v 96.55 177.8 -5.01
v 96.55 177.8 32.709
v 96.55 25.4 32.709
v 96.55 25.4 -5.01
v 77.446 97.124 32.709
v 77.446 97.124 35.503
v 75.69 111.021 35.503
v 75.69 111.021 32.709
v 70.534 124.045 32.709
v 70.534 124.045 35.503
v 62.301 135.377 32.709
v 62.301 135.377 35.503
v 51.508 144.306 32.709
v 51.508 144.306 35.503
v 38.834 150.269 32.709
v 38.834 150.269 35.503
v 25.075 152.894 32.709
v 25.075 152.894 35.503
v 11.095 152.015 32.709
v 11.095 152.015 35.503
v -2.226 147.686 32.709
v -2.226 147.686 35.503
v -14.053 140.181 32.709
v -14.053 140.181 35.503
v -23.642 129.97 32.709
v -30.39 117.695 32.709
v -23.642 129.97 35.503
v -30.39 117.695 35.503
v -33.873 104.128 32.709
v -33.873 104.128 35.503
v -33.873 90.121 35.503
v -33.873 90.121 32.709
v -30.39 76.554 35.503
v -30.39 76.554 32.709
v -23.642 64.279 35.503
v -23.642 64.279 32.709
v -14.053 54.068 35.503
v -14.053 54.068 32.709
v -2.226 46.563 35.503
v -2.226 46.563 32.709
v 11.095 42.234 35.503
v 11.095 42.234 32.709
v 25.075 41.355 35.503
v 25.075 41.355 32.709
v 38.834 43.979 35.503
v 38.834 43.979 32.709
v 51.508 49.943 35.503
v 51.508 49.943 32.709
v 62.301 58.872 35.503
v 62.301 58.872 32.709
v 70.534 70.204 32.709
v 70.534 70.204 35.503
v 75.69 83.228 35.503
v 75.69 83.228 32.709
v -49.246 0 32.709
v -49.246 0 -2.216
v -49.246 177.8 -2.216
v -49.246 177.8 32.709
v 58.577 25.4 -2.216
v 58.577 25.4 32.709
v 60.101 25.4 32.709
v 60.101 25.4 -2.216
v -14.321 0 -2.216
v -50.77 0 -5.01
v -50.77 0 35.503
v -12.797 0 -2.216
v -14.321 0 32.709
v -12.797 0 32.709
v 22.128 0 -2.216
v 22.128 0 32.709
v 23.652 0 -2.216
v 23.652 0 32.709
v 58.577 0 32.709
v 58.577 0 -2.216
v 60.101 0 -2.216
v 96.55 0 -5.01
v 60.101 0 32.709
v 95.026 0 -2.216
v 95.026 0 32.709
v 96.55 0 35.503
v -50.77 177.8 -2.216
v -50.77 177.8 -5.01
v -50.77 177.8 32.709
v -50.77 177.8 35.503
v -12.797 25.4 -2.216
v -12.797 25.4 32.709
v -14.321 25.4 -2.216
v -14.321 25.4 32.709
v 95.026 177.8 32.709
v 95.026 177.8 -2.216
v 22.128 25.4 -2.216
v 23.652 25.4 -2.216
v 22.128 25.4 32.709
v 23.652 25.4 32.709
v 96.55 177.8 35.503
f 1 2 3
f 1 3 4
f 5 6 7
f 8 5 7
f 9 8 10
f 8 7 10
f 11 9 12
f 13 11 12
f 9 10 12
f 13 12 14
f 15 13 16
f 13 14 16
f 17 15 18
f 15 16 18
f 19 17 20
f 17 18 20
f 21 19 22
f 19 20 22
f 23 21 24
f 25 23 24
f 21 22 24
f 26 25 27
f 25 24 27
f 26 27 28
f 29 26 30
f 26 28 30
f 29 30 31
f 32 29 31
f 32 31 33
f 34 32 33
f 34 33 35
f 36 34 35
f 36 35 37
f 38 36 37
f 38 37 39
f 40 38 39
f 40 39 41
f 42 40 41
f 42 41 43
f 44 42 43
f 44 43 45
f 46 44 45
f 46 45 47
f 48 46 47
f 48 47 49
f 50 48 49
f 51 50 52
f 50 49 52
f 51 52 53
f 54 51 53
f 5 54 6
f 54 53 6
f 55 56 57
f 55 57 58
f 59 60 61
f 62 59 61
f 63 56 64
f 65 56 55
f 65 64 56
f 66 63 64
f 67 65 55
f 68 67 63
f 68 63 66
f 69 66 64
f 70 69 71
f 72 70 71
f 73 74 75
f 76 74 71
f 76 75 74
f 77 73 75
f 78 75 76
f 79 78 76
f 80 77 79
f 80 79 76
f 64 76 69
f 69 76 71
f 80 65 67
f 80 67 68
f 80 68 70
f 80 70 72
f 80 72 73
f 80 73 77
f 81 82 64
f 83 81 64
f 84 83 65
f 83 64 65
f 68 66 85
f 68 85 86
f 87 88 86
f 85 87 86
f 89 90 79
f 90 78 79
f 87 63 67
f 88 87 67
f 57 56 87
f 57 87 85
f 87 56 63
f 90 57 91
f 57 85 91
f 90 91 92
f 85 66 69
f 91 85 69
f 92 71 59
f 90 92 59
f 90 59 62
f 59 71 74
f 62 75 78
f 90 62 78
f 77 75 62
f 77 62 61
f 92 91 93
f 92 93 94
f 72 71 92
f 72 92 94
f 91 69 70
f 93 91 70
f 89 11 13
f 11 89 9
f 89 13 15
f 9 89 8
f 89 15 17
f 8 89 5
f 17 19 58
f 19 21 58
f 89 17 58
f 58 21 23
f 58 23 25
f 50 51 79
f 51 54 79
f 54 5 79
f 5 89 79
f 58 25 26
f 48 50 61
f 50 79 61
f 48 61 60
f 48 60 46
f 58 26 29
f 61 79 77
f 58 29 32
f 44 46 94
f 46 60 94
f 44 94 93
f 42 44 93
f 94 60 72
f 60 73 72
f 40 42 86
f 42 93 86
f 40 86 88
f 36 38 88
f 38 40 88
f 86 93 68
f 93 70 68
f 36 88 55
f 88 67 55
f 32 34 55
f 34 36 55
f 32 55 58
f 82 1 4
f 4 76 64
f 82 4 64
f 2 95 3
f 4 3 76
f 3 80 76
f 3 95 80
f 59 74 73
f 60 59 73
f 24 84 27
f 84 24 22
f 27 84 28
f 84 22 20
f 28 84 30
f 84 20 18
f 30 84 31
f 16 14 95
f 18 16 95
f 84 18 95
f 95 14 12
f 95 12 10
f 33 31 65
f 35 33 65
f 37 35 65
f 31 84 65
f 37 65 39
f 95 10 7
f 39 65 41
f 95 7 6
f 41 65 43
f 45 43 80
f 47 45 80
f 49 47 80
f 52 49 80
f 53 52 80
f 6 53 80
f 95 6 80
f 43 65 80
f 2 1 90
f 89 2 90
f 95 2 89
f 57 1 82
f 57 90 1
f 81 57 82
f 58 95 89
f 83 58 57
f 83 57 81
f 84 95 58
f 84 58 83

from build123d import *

# Parameters (mm, degrees)
F0_W     = 147.32
F0_H     = 40.513
F0_W_2   = 1.524
F0_H_2   = 34.925
F1_DEPTH = 25.4
F2_W     = 1.5239988621
F2_H     = 34.925
F2_W_2   = 1.5240011379
F3_DEPTH = 152.4
F4_R     = 55.88
F5_DEPTH = 25.4


with BuildPart() as f1:
    # F0 (on Front) → F1 (new body)
    with BuildSketch(Plane.XZ):
        with Locations((22.8904561008, 15.2461919377)):
            Rectangle(F0_W, F0_H)
        Polygon((-49.2455427613, 32.7086919377), (-14.3205427613, 32.7086919377), (-12.7965427613, 32.7086919377), (22.1284572387, 32.7086919377), (23.6524572387, 32.7086919377), (58.5774572387, 32.7086919377), (60.1014572387, 32.7086919377), (95.0264572387, 32.7086919377), (95.0264572387, -2.2163080623), (60.1014572387, -2.2163080623), (58.5774572387, -2.2163080623), (23.6524572387, -2.2163080623), (22.1284572387, -2.2163080623), (-12.7965427613, -2.2163080623), (-14.3205427613, -2.2163080623), (-49.2455427613, -2.2163080623), align=None, mode=Mode.SUBTRACT)
        with Locations((-13.5585427613, 15.2461919377)):
            Rectangle(F0_W_2, F0_H_2)
        with Locations((22.8904572387, 15.2461919377)):
            Rectangle(F0_W_2, F0_H_2)
        with Locations((59.3394572387, 15.2461919377)):
            Rectangle(F0_W_2, F0_H_2)
    extrude(amount=-F1_DEPTH)

    # F2 (on face) → F3 (join)
    with BuildSketch(Plane(origin=(0, 25.4, 0), x_dir=(-1, 0, 0), z_dir=(0, 1, 0))):
        with Locations((-95.7884566697, 15.2461919377)):
            Rectangle(F2_W, F2_H)
        Polygon((-60.1014572387, -2.2163080623), (-95.0264572387, -2.2163080623), (-96.5504561008, -2.2163080623), (-96.5504561008, -5.0103080623), (50.7695438992, -5.0103080623), (50.7695438992, -2.2163080623), (49.2455427613, -2.2163080623), (14.3205427613, -2.2163080623), (12.7965427613, -2.2163080623), (-22.1284572387, -2.2163080623), (-23.6524572387, -2.2163080623), (-58.5774572387, -2.2163080623), align=None)
        Polygon((-96.5504561008, 32.7086919377), (-95.0264572387, 32.7086919377), (-60.1014572387, 32.7086919377), (-58.5774572387, 32.7086919377), (-23.6524572387, 32.7086919377), (-22.1284572387, 32.7086919377), (12.7965427613, 32.7086919377), (14.3205427613, 32.7086919377), (49.2455427613, 32.7086919377), (50.7695438992, 32.7086919377), (50.7695438992, 35.5026919377), (-96.5504561008, 35.5026919377), align=None)
        with Locations((50.0075433303, 15.2461919377)):
            Rectangle(F2_W_2, F2_H)
    extrude(amount=F3_DEPTH)

    # F4 (on face) → F5 (cut)
    with BuildSketch(Plane.XY.offset(35.5026919377)):
        with Locations((21.5660557151, 97.1244573593)):
            Circle(F4_R)
    extrude(amount=-F5_DEPTH, mode=Mode.SUBTRACT)


solid = f1.part
